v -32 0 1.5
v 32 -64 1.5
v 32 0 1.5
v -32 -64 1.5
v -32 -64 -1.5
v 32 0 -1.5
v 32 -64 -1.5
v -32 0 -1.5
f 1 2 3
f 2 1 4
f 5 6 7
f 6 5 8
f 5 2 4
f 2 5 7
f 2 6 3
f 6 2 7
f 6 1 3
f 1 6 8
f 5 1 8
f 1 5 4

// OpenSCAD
// file: config.scad
include <../config.scad>;

// settings specific to this pot type

inset_front = material_z/2;
inset_back = material_z/2;
inset_bottom = material_z;

hole_radius = 1.5;

hook_round_top_z = 3;
hook_round_bottom_z = 3;
// file: ../config.scad
// all measures in millimeters

// rendering quality
$fn = 200;
nothing = 0.05;

// material to cut from
material_z = 3;

// wall configuration: bounding box measures
wall_x = 550;
wall_y = 30;
wall_z = 400;

foot_y_back = 130;
foot_y_front = 200;

// foot height
foot_z = 25;

// rounded corners at front and back of the foot
foot_round_y = 20;

// number of support beams
support_count = 5;

// height of a support beam
support_z = 20;

// pot configuration: outer measures of the top opening
pot_x = 70;
pot_y = 70;
pot_z = 50;

// pots have hooks to hang at the wall supports
hook_width = 10;
// main file
include <../config.scad>;
include <config.scad>;

module pot_bottom()
{
    bottom_y = pot_y - 2*material_z;

    translate([
        0,
        -bottom_y/2,
        0
        ])
    cube([
        pot_x - 2*material_z,
        bottom_y,
        material_z
        ], center=true);
}

pot_bottom();
